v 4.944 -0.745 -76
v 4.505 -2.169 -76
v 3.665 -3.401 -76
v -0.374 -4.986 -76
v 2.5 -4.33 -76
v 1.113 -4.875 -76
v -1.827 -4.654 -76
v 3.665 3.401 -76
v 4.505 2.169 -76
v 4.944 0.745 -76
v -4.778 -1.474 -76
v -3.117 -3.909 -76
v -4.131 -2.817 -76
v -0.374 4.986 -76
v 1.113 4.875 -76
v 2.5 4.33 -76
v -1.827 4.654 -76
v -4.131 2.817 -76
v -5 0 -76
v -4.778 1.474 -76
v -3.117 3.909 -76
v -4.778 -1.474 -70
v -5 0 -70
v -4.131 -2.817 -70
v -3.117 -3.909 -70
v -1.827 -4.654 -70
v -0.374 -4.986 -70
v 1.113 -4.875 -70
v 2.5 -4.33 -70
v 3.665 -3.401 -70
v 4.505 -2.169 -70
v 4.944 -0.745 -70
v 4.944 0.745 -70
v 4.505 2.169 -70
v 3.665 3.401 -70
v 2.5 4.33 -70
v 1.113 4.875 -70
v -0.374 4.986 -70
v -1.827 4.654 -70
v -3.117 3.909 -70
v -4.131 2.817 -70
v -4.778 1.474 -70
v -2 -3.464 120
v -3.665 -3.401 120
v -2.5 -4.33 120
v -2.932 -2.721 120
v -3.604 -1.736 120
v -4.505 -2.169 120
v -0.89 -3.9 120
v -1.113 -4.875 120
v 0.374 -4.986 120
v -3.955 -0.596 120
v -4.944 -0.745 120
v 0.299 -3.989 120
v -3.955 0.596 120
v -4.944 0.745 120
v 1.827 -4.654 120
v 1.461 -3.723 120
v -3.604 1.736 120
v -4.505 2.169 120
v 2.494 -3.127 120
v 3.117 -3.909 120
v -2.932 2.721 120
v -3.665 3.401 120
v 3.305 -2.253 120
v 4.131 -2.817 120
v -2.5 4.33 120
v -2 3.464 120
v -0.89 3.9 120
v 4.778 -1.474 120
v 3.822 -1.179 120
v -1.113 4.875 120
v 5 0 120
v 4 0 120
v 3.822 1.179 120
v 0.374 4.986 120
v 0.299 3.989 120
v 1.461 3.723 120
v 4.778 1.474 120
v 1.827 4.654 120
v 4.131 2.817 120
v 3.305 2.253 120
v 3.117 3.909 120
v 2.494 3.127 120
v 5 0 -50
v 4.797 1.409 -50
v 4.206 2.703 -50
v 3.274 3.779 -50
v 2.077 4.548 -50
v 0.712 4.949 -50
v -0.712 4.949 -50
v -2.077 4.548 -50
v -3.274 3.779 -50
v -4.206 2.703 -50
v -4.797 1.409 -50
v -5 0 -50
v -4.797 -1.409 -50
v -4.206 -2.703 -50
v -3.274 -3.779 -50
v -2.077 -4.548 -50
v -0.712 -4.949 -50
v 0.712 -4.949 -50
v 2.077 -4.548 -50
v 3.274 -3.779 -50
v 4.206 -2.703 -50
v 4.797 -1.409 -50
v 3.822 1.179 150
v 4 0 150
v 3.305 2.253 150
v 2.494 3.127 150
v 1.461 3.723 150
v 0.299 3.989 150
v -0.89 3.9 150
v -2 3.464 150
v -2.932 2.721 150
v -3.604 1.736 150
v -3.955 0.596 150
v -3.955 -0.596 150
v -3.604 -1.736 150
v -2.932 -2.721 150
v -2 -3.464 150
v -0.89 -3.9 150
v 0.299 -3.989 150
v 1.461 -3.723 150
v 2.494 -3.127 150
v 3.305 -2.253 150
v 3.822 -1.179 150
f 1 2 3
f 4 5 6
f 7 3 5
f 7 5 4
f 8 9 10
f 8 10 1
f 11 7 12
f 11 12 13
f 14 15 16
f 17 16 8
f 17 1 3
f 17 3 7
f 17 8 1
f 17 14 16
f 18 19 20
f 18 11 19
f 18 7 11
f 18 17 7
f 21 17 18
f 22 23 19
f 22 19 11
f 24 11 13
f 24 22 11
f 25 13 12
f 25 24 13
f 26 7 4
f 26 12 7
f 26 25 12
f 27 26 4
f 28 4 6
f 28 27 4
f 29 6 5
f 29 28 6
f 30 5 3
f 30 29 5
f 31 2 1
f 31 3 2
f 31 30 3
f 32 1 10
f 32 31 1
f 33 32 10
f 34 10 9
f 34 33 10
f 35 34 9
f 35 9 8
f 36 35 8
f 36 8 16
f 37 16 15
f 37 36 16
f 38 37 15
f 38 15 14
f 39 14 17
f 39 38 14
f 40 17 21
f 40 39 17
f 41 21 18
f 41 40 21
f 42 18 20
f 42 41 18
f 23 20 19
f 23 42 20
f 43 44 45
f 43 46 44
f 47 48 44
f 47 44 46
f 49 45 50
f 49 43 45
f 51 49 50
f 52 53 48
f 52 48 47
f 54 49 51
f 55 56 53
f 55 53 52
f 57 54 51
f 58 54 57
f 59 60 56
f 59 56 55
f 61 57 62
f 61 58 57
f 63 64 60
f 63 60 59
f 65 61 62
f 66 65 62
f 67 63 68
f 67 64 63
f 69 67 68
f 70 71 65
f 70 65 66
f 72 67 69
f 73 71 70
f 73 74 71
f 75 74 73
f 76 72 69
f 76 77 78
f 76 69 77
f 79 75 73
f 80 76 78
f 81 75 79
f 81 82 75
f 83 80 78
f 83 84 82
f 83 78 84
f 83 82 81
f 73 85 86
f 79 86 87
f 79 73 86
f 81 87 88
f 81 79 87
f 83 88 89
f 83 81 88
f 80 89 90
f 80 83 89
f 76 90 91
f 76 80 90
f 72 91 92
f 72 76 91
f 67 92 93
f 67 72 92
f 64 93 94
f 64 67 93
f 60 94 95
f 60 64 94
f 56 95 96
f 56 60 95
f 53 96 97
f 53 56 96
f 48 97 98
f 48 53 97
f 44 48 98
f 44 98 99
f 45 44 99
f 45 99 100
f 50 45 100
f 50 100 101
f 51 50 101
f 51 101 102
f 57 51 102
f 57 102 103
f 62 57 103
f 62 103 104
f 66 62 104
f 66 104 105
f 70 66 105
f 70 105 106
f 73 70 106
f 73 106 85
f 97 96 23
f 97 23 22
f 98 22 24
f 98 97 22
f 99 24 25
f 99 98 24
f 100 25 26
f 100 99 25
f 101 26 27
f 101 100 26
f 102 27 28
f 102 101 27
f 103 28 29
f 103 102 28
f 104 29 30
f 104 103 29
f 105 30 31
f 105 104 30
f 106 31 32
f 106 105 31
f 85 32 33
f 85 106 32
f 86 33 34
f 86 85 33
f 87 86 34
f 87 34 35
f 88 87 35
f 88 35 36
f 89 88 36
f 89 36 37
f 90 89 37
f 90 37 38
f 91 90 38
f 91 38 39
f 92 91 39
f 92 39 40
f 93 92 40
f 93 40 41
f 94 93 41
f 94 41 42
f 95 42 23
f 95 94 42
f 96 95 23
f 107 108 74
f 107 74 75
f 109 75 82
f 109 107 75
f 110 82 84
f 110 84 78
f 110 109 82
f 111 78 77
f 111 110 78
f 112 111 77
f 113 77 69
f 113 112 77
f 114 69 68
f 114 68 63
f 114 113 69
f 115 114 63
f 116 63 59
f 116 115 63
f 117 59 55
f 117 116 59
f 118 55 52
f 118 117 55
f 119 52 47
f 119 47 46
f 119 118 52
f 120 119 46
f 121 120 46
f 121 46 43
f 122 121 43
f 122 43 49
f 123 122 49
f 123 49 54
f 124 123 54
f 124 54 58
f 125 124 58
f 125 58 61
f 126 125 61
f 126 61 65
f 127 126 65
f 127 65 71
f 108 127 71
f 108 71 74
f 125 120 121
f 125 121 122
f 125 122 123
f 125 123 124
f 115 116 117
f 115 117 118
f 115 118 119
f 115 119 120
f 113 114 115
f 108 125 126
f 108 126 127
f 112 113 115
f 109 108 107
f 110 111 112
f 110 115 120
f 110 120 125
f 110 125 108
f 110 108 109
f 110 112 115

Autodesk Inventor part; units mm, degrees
ref_plane "YZ Plane" through (0, 0, 0) normal (1, 0, 0) x (0, 1, 0)
ref_plane "XZ Plane" through (0, 0, 0) normal (0, 1, 0) x (-1, 0, 0)
ref_plane "XY Plane" through (0, 0, 0) normal (0, 0, 1) x (1, 0, 0)
sketch "Sketch1" plane through (0, 0, 0) normal (0, 0, 1) x (1, 0, 0)
  circle A0 centre (0, 0) radius 7.5 projected
  circle A1 centre (0, 0) radius 5.5 projected
  circle A2 centre (0, 0) radius 5 projected
extrude "Extrusion1" add sketch "Sketch1" against normal blind 50 contours A2
sketch "Sketch2" plane through (0, 0, 0) normal (0, 0, 1) x (1, 0, 0)
  point P0 (0, 0)
sketch "Sketch3" plane through (0, 0, 0) normal (0, 0, 1) x (1, 0, 0)
  circle A0 centre (0, 0) radius 5 projected
extrude "Extrusion2" add sketch "Sketch3" along normal blind 150
sketch "Sketch4" plane through (0, 0, 150) normal (0, 0, 1) x (1, 0, 0)
  circle A0 centre (0, 0) radius 5 projected
  circle A1 centre (0, 0) radius 4
  dimension "d4" = 8
extrude "Extrusion3" cut sketch "Sketch4" against normal blind 30
sketch "Sketch5" plane through (0, 0, -50) normal (0, 0, -1) x (-1, 0, 0)
  circle A0 centre (0, 0) radius 5 projected
extrude "Extrusion4" add sketch "Sketch5" along normal blind 20
sketch "Szkic6" plane through (0, 0, -70) normal (0, 0, -1) x (-1, 0, 0)
  circle A0 centre (0, 0) radius 4 projected
  circle A1 centre (0, 0) radius 5
extrude "Wyciągnięcie proste5" add sketch "Szkic6" along normal blind 6 contours A0 | A1
properties part number "os_napedowa"
